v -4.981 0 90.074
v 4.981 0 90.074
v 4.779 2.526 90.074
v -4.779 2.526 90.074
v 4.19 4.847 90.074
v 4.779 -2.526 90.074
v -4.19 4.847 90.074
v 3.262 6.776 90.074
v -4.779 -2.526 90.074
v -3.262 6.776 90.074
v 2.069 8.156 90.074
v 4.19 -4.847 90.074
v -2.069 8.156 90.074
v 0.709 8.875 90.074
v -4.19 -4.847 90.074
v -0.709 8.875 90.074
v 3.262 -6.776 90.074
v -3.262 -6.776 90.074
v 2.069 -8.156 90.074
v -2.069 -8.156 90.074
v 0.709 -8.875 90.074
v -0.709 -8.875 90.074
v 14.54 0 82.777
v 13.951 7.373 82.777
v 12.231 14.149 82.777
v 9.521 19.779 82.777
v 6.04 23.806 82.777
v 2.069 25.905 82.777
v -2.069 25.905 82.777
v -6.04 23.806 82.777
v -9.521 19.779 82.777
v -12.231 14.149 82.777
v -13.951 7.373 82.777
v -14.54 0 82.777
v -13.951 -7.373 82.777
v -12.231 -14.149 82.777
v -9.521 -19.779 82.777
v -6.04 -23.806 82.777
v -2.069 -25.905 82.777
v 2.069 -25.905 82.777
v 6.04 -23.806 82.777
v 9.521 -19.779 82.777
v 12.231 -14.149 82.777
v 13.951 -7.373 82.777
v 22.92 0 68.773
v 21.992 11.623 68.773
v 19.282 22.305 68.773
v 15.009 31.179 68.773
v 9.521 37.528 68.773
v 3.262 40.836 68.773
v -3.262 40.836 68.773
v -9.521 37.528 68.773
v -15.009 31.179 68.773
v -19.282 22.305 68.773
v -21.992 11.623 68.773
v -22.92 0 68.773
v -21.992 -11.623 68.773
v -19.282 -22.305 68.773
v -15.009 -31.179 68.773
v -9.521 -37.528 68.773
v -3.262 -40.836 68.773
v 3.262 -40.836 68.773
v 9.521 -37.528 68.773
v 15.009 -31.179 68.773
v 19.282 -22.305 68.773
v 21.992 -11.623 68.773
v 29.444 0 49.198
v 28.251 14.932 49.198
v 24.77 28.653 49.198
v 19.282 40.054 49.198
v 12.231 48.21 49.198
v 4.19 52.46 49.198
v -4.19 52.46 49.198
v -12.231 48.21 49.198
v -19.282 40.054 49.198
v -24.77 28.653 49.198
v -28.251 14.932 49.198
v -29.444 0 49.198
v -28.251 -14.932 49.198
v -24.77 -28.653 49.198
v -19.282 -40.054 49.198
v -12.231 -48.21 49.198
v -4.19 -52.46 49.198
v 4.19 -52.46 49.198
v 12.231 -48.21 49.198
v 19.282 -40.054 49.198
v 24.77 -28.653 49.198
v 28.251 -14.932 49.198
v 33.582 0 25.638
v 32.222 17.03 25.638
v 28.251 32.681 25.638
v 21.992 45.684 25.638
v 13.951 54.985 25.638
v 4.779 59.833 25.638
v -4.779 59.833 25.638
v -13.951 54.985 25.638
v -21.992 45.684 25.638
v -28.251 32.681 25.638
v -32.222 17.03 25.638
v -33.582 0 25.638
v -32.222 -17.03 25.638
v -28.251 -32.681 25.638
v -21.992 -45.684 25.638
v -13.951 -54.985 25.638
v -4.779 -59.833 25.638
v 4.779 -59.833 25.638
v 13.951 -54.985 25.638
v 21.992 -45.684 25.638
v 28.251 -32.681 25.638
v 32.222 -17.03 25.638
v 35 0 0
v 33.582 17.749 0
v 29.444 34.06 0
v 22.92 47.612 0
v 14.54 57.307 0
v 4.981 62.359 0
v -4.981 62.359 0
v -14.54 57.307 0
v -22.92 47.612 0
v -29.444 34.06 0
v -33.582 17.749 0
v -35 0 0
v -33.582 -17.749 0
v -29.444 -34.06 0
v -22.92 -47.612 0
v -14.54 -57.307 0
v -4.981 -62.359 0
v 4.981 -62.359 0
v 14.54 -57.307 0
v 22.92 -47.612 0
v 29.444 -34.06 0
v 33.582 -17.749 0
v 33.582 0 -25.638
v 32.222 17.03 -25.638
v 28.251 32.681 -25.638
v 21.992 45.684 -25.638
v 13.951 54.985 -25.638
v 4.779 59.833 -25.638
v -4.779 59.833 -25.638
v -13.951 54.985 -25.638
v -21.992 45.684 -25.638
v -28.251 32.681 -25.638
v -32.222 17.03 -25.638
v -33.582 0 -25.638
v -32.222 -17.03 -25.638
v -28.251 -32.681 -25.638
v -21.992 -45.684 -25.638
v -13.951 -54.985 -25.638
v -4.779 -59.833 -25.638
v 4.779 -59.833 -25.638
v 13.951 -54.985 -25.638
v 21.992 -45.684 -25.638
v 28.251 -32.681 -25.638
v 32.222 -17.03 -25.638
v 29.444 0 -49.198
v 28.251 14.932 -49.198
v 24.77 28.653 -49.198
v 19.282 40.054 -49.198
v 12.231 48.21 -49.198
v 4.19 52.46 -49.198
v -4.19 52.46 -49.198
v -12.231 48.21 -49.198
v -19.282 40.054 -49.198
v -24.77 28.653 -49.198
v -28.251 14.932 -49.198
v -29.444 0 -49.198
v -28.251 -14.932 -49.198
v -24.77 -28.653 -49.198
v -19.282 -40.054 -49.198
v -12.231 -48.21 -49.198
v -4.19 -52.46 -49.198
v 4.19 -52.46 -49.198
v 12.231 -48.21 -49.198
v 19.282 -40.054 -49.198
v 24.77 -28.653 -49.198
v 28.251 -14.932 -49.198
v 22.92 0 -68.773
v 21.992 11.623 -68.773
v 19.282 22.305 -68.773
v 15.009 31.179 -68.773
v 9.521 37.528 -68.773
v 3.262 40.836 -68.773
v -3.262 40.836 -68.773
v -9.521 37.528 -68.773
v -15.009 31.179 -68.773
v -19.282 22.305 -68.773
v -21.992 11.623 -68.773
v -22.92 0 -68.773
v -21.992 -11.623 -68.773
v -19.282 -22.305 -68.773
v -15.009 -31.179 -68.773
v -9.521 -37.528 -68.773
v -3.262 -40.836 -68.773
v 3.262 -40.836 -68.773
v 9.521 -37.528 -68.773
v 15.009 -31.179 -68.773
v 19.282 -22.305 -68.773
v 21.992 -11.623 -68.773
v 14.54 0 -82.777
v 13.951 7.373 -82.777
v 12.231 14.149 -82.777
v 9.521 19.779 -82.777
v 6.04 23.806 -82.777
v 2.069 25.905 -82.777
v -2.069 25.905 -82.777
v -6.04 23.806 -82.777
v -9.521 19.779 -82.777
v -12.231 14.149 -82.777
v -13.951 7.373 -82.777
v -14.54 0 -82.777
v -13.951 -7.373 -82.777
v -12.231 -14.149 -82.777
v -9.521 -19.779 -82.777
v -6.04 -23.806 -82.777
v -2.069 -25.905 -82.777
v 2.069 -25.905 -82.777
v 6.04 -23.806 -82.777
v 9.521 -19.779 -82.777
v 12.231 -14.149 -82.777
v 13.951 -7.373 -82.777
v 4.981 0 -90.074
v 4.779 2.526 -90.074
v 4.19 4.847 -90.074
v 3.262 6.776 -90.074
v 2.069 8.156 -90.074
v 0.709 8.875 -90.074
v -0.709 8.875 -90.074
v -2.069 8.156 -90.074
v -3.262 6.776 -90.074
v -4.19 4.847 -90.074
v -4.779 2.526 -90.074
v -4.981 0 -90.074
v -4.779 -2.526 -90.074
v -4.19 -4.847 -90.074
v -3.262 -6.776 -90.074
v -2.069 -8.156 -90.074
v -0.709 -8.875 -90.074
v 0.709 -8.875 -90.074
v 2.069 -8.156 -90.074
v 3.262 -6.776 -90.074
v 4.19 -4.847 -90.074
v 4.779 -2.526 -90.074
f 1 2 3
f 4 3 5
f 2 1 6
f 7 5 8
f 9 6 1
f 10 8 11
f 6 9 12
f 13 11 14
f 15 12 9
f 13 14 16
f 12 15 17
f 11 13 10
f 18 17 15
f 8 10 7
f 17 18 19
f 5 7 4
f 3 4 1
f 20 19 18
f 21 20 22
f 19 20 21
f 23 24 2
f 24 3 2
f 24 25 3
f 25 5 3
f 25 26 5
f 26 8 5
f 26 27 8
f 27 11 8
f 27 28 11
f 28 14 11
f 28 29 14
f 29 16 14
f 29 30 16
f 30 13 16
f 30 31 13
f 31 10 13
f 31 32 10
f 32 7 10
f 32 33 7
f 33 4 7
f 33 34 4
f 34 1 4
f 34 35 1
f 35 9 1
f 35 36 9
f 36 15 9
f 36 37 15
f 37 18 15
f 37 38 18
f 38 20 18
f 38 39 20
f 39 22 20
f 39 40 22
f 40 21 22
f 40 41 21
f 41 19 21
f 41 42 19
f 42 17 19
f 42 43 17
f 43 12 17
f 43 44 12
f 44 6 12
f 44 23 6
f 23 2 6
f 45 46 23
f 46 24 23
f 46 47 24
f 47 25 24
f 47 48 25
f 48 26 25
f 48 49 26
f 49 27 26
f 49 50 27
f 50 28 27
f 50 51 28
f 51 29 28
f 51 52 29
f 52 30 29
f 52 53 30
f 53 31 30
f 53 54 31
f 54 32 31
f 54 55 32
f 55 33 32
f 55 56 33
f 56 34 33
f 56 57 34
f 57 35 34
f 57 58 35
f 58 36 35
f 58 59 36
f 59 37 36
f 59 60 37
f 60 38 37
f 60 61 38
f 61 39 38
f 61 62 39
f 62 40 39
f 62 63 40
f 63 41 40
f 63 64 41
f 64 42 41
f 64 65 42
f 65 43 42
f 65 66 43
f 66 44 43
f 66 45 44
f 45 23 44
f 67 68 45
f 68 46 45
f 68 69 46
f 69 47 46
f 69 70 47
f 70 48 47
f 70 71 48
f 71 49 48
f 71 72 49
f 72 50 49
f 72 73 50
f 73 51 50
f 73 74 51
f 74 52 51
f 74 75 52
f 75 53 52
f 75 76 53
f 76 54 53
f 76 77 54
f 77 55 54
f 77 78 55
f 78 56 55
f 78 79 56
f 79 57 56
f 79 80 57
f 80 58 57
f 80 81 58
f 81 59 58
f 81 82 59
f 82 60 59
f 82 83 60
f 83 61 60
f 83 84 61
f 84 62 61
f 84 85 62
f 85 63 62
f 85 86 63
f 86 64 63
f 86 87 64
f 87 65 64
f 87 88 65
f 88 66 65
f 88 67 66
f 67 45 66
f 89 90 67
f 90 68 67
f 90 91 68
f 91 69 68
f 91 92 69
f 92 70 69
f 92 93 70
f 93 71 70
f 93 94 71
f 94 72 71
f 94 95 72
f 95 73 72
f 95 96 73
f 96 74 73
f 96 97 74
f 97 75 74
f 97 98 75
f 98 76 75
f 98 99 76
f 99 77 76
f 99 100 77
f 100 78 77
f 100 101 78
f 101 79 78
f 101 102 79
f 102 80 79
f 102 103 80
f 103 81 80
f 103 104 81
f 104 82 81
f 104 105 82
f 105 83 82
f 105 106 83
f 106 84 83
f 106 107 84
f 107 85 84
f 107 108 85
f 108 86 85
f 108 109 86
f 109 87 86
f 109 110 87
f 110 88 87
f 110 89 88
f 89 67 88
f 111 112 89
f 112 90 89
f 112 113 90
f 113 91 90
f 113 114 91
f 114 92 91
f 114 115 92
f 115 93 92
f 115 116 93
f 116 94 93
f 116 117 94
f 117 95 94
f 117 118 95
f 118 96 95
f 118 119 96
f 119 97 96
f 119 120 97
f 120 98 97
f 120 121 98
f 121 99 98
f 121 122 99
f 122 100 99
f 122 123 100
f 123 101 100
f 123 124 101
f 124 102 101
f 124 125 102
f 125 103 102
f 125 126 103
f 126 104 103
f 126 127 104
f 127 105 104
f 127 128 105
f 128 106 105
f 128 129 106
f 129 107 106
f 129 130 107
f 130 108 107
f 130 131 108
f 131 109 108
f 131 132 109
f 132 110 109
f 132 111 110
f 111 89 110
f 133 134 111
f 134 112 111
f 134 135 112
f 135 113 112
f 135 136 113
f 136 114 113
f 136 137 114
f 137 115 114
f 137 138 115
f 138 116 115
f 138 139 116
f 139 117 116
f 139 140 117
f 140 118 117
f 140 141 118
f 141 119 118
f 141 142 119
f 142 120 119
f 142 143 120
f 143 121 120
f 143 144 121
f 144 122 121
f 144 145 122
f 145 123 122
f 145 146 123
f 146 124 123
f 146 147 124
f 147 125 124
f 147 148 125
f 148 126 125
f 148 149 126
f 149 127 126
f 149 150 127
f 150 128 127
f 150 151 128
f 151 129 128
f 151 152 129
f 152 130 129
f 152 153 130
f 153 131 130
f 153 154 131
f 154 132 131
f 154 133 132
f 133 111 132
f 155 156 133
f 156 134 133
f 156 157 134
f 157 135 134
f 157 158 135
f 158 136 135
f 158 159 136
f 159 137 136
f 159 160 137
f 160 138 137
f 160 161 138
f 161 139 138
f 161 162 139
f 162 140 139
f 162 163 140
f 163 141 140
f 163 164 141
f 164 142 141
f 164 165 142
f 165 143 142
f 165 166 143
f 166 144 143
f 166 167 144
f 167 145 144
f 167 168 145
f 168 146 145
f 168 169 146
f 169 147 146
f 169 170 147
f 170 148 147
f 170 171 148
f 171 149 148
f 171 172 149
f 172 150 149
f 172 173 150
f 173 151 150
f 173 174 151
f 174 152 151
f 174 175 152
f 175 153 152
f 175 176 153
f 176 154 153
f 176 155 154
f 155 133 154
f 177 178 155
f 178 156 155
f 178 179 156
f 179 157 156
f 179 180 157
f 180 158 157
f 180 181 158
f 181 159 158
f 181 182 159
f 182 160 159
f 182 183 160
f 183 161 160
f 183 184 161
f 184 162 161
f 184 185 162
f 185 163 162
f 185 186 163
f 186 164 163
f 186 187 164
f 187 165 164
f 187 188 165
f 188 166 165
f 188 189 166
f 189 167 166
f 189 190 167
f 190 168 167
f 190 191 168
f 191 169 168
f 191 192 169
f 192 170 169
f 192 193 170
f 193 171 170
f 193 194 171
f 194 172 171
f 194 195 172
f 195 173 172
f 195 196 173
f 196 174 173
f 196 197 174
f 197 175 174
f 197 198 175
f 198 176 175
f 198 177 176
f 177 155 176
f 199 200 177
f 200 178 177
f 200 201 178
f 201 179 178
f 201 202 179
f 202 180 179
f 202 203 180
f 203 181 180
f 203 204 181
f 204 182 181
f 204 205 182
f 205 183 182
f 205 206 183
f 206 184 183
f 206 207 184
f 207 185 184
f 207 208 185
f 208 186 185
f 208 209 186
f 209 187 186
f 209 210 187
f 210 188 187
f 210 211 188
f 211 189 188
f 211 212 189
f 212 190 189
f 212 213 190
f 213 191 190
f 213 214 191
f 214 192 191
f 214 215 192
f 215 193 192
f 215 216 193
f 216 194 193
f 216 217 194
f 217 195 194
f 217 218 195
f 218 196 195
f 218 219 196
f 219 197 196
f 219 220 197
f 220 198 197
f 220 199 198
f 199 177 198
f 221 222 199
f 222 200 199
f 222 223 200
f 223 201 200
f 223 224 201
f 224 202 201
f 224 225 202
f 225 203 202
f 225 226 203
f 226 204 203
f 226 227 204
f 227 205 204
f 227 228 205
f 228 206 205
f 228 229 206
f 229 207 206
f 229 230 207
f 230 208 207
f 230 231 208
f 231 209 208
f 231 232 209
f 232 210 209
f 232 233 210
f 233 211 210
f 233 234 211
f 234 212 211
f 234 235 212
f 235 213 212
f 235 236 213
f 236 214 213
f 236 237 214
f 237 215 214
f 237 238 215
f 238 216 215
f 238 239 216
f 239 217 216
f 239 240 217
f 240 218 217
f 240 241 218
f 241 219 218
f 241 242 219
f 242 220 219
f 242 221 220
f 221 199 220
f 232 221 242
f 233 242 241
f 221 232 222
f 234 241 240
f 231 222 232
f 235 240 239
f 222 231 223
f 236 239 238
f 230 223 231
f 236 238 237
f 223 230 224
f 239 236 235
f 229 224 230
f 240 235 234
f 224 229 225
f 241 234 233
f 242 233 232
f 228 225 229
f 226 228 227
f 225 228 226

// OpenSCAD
// Generated by SolidPython 1.0.1 on 2020-07-29 00:46:46


scale(v = [5, 9, 13]) {
	sphere(r = 7);
}
/***********************************************
*********      SolidPython code:      **********
************************************************
 
# import packages: SolidPython
from solid import *
from solid.utils import *
from itertools import chain, combinations, permutations


class Resize:

    def __init__(self, scad_file):
        self.scad_file = scad_file
        #self.scad_file = import_scad(scad_file)
        # cone/cylinder param:
        self.r1 = 0
        self.r2 = 0
        self.h = 0
        # rectangular prism param:
        self.w = 0
        self.l = 0
        # ellipse param:
        self.r = 0

    # import OpenScad code (file name corresponds to shape)


    # classify shape + parameters
    def assign(self, param1, param2, param3):
        if self.scad_file == 'cone.scad':
            self.r1 = param1
            self.r2 = param2
            self.h = param3
        elif self.scad_file == 'cylinder.scad':
            self.r1 = param1
            self.r2 = param2
            self.h = param3
        elif self.scad_file == 'rectangularPrism.scad':
            self.h = param1
            self.l = param2
            self.w = param3
        else:
            self.r = param1
            self.h = param2

    # resize parameters
    def iterate(self):
        x = range(3, 20, 2)
        i = 1
        if self.scad_file == 'cone.scad':
            tempList = list(permutations(x, 2))
            for temp in tempList:
                param1 = temp[0]
                param2 = temp[1]
                filepath = 'produced_scad_files/' + 'cone' + str(param1) + '_' + str(param2) + '_' + '.scad'
                scad_render_to_file(cylinder(h=param1, r1=param2, r2=0), filepath)

        elif self.scad_file == 'cylinder.scad':
            tempList = list(permutations(x, 3))
            for temp in tempList:
                param1 = temp[0]
                param2 = temp[1]
                filepath = 'produced_scad_files/' + 'cylinder' + str(param1) + '_' + str(param2) + '_' + '.scad'
                scad_render_to_file(cylinder(h=param1, r1=param2, r2=param2), filepath)

        elif self.scad_file == 'rectangularPrism.scad':
            tempList = list(permutations(x, 3))
            for temp in tempList:
                param1 = temp[0]
                param2 = temp[1]
                param3 = temp[2]
                filepath = 'produced_scad_files/' + 'rectangularPrism' + str(param1) + '_' + str(param2) + '_' + str(
                    param3) + '.scad'
                scad_render_to_file(cube(size=(param1, param2, param3)), filepath)

        elif self.scad_file == 'ellipse.scad':
            tempList = list(permutations(x, 4))
            for temp in tempList:
                param1 = temp[0]
                param2 = temp[1]
                param3 = temp[2]
                param4 = temp[3]
                filepath = 'produced_scad_files/' + 'ellipse' + str(param1) + '_' + str(param2) + '_' + str(param3) + '_' + str(param4) + '.scad'
                scad_render_to_file(scale([param1, param2, param3])(sphere(r=param4)), filepath)

    def render_to_scadfile(self):
        scad_render_to_file(scad, 'example.scad') 
 
************************************************/
